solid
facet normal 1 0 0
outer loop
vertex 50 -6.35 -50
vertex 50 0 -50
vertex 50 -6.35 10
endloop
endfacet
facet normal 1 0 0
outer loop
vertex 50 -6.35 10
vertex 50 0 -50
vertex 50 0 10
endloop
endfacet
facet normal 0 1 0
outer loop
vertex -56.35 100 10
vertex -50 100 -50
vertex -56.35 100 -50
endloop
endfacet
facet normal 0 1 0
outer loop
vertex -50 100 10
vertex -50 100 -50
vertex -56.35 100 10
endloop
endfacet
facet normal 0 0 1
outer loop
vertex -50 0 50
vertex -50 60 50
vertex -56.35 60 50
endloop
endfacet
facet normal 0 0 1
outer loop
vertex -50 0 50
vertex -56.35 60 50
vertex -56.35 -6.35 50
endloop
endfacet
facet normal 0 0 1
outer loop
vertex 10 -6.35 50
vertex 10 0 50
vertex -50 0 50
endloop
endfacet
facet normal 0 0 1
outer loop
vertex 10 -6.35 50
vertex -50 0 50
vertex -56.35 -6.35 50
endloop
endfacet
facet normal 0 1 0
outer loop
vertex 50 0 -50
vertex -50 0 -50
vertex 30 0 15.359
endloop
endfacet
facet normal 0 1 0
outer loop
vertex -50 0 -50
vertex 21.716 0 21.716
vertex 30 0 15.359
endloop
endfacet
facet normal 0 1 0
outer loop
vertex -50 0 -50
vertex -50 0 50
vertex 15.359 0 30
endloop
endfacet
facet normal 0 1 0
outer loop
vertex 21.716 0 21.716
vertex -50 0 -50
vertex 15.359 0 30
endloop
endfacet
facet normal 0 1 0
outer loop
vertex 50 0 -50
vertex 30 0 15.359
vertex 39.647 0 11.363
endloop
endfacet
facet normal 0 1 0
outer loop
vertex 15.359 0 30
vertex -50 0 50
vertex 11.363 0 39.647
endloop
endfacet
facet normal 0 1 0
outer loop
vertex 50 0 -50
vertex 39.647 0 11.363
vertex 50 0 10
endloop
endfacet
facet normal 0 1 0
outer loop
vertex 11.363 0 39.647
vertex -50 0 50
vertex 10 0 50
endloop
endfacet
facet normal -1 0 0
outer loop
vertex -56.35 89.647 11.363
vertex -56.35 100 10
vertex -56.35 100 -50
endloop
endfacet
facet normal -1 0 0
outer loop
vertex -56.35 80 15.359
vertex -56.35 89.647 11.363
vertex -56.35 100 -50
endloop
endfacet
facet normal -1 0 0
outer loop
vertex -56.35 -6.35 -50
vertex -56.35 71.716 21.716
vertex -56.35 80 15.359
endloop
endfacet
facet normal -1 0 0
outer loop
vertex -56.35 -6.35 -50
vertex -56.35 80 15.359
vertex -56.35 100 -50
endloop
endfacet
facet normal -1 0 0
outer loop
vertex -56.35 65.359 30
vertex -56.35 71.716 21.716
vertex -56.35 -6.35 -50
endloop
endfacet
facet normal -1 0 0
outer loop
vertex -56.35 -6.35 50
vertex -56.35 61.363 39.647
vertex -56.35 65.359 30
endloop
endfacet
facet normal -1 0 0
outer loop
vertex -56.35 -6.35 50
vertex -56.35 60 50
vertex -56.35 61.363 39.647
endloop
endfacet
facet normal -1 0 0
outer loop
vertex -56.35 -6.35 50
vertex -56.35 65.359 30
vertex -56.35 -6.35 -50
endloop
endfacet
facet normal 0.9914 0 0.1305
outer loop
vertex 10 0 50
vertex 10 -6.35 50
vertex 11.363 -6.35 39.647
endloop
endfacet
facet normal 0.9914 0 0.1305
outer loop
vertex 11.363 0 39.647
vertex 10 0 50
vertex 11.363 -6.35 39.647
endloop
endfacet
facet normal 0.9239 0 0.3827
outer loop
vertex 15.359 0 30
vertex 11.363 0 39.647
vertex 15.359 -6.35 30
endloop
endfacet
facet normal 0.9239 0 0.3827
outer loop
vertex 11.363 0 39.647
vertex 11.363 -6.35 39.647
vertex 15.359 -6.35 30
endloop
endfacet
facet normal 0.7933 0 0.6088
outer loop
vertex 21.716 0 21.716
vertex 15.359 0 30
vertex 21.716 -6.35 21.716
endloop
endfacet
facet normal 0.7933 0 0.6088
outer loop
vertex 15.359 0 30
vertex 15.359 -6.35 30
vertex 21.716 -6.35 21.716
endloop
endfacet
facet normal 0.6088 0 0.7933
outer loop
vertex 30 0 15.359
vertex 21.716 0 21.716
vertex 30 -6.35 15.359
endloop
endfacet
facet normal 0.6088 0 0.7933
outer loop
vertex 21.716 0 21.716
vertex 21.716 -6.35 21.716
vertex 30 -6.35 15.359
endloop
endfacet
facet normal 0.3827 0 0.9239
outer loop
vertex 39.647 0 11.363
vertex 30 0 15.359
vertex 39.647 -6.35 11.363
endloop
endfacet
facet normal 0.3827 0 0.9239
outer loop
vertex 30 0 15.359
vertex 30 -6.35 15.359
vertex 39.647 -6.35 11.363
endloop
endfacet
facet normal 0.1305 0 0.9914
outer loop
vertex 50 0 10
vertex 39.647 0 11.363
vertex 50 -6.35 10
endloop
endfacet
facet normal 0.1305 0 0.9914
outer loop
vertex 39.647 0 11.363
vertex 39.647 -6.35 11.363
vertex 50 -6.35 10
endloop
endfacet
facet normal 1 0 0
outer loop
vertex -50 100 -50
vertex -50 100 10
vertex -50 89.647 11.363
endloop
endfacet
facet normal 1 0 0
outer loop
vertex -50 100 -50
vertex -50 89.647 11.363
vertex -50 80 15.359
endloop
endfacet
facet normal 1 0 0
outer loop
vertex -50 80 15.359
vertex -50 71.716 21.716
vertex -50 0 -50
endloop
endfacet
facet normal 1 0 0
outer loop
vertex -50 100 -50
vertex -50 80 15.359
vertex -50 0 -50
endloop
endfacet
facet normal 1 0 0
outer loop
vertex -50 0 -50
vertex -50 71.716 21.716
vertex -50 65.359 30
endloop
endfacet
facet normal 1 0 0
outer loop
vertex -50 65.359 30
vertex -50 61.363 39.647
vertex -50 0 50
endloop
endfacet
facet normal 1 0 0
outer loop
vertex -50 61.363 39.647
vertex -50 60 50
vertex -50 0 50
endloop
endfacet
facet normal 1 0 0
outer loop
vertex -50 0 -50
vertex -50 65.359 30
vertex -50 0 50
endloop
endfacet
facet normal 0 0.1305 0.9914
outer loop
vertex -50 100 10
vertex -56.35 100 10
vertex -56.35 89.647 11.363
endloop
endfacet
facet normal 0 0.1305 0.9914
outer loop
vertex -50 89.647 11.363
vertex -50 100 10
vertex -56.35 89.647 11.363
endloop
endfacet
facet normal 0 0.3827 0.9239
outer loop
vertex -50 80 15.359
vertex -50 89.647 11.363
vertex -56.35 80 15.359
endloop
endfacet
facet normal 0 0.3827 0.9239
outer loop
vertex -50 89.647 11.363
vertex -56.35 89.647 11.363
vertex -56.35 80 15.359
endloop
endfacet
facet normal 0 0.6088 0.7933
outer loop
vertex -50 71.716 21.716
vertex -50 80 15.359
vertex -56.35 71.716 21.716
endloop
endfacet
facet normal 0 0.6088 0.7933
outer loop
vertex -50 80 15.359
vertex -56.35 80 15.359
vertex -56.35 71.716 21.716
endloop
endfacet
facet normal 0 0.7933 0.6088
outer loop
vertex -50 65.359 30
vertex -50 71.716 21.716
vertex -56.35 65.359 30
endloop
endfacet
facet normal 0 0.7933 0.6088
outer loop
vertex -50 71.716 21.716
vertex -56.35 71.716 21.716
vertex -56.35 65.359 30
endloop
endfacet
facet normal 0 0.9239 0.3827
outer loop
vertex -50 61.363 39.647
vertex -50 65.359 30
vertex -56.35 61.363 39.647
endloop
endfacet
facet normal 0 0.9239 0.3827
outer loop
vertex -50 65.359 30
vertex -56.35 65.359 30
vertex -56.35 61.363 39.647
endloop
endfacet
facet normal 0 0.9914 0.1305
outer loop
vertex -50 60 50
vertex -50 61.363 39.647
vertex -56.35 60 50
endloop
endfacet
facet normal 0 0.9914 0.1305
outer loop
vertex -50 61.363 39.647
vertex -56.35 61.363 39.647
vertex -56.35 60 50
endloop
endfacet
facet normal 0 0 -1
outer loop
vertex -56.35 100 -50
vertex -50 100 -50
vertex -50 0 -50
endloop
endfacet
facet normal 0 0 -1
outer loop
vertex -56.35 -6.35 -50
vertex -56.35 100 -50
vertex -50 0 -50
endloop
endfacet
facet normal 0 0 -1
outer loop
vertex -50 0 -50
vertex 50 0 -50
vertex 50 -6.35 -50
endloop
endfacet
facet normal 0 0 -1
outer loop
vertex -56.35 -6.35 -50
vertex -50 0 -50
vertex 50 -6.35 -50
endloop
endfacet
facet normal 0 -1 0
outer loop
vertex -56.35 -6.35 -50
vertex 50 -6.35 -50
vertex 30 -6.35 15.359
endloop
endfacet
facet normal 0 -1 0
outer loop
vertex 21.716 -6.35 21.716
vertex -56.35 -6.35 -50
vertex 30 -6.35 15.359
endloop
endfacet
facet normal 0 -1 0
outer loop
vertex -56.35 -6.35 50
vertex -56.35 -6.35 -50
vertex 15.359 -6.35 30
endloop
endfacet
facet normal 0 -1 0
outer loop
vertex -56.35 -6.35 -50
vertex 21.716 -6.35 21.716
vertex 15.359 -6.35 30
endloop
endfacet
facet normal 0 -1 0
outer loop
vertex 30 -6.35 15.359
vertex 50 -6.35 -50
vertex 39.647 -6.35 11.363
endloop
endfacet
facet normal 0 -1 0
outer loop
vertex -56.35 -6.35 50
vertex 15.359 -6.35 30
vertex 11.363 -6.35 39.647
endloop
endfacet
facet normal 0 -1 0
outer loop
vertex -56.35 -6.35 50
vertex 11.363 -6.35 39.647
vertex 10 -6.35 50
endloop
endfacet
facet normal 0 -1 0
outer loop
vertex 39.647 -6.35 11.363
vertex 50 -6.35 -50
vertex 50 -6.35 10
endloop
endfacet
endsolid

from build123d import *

# Parameters (mm, degrees)
F0_W     = 100
F0_H     = 100
F1_DEPTH = 6.35
F2_W     = 106.35
F2_H     = 100
F3_DEPTH = 6.35
F6_DEPTH = 25
F7_DEPTH = 25


with BuildPart() as f1:
    # F0 (on Front) → F1 (new body)
    with BuildSketch(Plane.XZ):
        Rectangle(F0_W, F0_H)
    extrude(amount=F1_DEPTH)

    # F2 (on face) → F3 (join)
    with BuildSketch(Plane(origin=(-50, 0, 0), x_dir=(0, -1, 0), z_dir=(-1, 0, 0))):
        with Locations((-46.825, 0)):
            Rectangle(F2_W, F2_H)
    extrude(amount=F3_DEPTH)

    # F5 (on face) → F6 (cut)
    with BuildSketch(Plane(origin=(-56.35, 0, 0), x_dir=(0, -1, 0), z_dir=(-1, 0, 0))):
        with BuildLine():
            Line((-100, 50), (-100, 10))
            ThreePointArc((-100, 10), (-71.715729, 21.715729), (-60, 50))
            Line((-60, 50), (-100, 50))
        make_face()
    extrude(amount=-F6_DEPTH, mode=Mode.SUBTRACT)

    # F4 (on face) → F7 (cut)
    with BuildSketch(Plane.XZ.offset(6.35)):
        with BuildLine():
            Line((50, 50), (10, 50))
            ThreePointArc((10, 50), (21.715729, 21.715729), (50, 10))
            Line((50, 10), (50, 50))
        make_face()
    extrude(amount=-F7_DEPTH, mode=Mode.SUBTRACT)


solid = f1.part
